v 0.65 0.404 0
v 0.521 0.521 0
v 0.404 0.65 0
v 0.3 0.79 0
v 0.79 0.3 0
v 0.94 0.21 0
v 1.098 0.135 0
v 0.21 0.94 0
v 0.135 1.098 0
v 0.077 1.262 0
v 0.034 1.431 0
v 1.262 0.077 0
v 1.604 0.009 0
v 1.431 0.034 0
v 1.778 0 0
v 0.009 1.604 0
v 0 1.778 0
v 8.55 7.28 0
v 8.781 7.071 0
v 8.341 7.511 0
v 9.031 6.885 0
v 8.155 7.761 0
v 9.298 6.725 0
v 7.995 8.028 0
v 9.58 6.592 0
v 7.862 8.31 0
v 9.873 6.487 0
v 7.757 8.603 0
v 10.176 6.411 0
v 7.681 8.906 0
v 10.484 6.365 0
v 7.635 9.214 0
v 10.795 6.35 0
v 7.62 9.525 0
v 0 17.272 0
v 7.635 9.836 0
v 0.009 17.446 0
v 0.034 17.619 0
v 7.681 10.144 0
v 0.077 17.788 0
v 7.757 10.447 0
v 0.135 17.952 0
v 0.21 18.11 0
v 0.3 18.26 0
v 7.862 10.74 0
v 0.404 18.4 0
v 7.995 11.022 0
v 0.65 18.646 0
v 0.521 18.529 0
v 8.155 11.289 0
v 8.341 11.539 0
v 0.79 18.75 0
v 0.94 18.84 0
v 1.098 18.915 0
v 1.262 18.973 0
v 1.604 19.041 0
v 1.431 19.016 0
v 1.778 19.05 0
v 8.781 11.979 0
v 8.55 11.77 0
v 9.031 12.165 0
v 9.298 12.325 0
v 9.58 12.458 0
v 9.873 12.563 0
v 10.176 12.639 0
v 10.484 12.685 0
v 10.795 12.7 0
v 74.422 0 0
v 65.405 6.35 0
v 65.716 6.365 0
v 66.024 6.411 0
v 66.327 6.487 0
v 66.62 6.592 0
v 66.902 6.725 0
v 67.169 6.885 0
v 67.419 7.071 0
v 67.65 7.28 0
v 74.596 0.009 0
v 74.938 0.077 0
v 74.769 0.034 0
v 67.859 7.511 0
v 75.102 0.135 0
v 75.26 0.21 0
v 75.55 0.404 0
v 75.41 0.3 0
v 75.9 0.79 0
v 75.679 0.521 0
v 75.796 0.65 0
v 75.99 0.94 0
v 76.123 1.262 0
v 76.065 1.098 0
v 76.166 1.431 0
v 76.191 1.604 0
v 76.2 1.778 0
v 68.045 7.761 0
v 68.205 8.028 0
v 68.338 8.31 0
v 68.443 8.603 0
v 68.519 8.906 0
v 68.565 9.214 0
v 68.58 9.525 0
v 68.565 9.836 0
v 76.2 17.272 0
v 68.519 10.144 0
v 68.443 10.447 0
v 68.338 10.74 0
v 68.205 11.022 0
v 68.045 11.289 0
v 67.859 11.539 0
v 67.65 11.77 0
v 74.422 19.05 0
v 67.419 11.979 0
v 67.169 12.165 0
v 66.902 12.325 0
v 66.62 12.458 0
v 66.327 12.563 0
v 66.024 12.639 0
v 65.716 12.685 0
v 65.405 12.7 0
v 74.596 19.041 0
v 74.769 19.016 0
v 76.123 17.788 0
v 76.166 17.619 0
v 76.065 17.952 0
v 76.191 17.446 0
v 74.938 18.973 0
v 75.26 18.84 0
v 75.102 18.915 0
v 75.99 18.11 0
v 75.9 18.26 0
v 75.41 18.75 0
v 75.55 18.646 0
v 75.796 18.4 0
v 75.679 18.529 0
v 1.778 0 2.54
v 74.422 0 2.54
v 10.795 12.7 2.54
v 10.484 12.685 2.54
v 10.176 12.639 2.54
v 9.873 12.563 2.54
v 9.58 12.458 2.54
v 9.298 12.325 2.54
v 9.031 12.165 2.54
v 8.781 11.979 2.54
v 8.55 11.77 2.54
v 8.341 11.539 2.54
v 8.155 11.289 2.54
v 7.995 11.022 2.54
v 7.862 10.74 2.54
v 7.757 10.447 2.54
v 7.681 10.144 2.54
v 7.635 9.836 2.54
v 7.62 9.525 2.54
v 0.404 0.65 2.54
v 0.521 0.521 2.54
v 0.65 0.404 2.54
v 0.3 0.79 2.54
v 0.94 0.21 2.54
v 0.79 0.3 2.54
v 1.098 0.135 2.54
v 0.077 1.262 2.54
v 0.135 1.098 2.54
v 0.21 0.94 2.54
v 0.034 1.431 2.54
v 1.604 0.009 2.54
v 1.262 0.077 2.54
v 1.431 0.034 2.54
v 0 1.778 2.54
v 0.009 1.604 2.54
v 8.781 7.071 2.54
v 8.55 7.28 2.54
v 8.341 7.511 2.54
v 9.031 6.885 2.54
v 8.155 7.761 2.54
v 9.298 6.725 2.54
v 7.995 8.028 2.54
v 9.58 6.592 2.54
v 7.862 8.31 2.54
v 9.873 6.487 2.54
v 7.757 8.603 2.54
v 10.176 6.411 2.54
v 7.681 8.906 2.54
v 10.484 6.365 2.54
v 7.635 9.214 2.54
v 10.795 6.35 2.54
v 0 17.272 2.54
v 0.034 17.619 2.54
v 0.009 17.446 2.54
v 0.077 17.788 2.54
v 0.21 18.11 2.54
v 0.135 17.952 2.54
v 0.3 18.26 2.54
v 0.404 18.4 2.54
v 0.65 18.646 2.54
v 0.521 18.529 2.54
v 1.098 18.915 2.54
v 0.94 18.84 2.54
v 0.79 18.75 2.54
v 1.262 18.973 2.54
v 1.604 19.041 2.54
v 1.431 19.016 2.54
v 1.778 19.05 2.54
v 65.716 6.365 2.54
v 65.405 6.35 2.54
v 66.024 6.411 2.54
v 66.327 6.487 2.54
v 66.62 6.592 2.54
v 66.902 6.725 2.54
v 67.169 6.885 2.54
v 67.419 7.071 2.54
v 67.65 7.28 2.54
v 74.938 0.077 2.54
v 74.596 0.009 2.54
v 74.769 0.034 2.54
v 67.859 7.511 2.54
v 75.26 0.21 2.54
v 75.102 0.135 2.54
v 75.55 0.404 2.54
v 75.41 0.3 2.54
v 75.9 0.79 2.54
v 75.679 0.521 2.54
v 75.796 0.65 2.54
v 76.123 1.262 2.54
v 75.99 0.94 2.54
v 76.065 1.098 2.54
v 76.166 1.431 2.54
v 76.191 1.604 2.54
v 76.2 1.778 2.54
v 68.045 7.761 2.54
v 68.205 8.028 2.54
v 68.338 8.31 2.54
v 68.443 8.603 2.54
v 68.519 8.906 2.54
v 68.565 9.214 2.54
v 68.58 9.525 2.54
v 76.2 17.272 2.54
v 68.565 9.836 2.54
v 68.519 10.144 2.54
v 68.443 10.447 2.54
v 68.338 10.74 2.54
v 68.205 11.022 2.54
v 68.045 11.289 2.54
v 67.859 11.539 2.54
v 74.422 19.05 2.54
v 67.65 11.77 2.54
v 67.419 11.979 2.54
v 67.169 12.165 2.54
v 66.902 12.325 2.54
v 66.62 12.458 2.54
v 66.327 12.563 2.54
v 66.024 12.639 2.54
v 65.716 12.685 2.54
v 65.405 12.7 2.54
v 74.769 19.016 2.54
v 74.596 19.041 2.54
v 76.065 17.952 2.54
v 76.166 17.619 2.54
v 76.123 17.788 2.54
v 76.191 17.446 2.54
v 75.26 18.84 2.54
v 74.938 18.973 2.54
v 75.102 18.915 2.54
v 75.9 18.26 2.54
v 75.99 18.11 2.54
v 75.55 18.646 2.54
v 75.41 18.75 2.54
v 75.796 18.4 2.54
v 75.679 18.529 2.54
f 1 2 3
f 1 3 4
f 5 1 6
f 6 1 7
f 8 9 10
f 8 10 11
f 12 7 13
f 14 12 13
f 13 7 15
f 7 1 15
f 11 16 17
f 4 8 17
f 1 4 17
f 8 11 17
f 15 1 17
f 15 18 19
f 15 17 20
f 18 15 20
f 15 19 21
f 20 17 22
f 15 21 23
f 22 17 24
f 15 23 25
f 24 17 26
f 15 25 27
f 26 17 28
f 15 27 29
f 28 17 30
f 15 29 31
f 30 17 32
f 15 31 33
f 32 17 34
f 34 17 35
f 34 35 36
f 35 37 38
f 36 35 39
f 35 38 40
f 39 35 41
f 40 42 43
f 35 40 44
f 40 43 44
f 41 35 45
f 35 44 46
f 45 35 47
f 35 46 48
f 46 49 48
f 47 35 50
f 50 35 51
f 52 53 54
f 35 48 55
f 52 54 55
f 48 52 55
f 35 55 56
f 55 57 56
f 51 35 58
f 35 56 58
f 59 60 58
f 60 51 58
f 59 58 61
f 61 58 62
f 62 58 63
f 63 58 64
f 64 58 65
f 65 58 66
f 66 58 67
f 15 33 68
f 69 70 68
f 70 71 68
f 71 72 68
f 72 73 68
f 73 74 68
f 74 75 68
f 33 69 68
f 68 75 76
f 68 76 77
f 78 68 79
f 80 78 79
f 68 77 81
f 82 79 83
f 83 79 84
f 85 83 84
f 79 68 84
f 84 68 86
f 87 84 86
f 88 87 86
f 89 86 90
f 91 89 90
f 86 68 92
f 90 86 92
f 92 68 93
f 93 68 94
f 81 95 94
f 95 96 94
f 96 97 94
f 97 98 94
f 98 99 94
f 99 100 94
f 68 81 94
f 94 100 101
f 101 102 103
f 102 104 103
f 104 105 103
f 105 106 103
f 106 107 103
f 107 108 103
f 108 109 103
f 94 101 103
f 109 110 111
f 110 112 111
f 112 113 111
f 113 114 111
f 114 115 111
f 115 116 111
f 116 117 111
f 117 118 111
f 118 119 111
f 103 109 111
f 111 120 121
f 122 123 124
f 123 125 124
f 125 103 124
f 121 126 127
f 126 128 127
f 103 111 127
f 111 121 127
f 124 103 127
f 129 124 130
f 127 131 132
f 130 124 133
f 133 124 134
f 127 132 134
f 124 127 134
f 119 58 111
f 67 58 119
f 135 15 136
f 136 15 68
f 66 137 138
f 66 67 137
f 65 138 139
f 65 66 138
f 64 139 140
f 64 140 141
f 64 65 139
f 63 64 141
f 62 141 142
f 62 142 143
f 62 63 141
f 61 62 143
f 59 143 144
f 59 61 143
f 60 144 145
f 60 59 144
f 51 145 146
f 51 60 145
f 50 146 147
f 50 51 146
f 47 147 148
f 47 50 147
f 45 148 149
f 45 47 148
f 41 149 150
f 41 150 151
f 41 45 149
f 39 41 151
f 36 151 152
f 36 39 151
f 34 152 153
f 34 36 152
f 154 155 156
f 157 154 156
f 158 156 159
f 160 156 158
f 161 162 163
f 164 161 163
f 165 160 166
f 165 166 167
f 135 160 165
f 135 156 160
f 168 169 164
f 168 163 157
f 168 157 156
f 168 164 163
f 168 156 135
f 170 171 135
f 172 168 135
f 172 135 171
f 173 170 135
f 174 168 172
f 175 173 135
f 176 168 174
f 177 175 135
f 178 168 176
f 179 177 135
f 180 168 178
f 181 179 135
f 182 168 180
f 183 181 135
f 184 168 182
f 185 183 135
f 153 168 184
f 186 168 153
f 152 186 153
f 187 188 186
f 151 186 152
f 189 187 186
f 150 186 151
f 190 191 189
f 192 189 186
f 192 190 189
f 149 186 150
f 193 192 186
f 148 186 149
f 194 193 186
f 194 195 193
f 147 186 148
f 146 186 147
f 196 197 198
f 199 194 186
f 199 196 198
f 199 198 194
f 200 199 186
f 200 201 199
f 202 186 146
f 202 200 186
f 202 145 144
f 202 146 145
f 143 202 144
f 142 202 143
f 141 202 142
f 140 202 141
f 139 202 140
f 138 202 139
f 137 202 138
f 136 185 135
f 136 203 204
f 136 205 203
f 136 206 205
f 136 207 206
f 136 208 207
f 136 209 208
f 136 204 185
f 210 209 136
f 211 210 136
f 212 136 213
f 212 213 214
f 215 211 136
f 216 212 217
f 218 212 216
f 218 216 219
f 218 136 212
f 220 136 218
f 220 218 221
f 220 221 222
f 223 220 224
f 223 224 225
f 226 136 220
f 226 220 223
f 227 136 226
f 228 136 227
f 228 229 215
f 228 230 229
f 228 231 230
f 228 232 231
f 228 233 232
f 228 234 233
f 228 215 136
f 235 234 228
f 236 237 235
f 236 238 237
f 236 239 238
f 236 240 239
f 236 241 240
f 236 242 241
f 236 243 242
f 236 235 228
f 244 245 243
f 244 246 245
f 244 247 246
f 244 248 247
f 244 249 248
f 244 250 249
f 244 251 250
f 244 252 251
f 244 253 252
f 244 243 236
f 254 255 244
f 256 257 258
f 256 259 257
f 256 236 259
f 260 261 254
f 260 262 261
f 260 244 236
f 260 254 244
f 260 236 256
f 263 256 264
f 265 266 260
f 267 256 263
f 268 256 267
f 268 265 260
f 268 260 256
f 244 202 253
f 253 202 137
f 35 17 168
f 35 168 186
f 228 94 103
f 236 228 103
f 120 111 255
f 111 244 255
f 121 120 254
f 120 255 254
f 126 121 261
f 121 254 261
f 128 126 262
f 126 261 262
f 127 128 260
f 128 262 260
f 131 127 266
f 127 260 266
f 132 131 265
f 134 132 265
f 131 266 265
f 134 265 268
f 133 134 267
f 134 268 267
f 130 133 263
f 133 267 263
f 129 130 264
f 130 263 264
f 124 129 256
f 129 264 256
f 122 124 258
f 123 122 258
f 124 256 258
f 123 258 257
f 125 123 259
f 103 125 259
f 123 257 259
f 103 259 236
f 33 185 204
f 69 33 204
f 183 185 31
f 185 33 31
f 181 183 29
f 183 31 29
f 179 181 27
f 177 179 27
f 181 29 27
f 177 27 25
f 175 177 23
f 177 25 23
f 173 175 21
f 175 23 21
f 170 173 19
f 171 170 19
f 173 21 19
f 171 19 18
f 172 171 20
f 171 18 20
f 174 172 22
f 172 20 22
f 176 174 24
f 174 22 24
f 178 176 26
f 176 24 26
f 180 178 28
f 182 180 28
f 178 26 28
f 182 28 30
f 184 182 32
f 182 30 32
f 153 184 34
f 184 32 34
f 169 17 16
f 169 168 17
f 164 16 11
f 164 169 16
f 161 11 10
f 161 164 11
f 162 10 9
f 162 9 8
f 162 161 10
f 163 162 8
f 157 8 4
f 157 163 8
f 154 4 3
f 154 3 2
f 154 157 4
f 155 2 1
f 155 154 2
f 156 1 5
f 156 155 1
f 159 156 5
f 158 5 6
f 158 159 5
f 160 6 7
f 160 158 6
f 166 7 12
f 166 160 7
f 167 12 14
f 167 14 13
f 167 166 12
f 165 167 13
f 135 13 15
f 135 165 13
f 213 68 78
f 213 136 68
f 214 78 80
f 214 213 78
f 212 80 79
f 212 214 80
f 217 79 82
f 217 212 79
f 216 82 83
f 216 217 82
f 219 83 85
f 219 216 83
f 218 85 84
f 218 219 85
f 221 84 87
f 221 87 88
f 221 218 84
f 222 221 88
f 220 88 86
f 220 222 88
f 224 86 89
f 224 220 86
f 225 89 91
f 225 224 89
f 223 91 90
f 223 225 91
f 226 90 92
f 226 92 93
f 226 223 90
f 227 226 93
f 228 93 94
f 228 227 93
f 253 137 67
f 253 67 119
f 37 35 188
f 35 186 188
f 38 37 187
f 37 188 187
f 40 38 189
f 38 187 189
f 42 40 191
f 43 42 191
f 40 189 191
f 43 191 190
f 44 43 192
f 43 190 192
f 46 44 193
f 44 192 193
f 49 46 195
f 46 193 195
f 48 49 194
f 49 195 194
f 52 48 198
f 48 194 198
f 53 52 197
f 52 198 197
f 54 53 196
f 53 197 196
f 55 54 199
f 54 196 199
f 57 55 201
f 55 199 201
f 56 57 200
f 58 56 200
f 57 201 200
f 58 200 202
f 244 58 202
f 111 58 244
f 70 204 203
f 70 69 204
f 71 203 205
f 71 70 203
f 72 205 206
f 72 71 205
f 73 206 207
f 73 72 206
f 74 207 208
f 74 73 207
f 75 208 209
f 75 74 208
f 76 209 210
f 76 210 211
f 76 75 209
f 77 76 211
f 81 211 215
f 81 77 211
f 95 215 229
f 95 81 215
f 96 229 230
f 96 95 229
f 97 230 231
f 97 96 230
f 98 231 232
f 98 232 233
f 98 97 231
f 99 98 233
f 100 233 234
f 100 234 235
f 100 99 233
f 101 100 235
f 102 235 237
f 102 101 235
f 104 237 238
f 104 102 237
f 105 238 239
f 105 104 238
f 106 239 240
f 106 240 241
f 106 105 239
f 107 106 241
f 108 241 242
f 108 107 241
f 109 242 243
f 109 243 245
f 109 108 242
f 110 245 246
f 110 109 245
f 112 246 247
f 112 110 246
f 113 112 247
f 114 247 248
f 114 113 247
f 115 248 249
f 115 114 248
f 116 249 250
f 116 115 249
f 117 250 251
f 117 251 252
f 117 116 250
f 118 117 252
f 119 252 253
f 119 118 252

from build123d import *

# Parameters (mm, degrees)
SKETCH1_W           = 76.2
SKETCH1_H           = 19.05
BOSS_EXTRUDE1_DEPTH = 2.54
SKETCH2_W           = 60.96
SKETCH2_H           = 6.35
CUT_EXTRUDE1_DEPTH  = 2.54
FILLET1_R           = 3.175
FILLET2_R           = 1.778


with BuildPart() as part:
    # Sketch1 → Boss-Extrude1 (new body)
    with BuildSketch(Plane.XY):
        with Locations((38.1, 9.525)):
            Rectangle(SKETCH1_W, SKETCH1_H)
    extrude(amount=BOSS_EXTRUDE1_DEPTH)

    # Sketch2 → Cut-Extrude1 (cut)
    with BuildSketch(Plane.XY.offset(2.54)):
        with Locations((38.1, 9.525)):
            Rectangle(SKETCH2_W, SKETCH2_H)
    extrude(amount=-CUT_EXTRUDE1_DEPTH, mode=Mode.SUBTRACT)

    # Fillet1
    fillet1_edges = [part.edges().sort_by_distance(p)[0] for p in [
        (68.58, 6.35, 1.27),
        (7.62, 12.7, 1.27),
        (7.62, 6.35, 1.27),
        (68.58, 12.7, 1.27),
    ]]
    fillet(fillet1_edges, radius=FILLET1_R - 0.0001)  # a hair under: the kernel refuses the full size

    # Fillet2
    fillet2_edges = [part.edges().sort_by_distance(p)[0] for p in [
        (0, 19.05, 1.27),
        (76.2, 19.05, 1.27),
        (76.2, 0, 1.27),
        (0, 0, 1.27),
    ]]
    fillet(fillet2_edges, radius=FILLET2_R)


solid = part.part
